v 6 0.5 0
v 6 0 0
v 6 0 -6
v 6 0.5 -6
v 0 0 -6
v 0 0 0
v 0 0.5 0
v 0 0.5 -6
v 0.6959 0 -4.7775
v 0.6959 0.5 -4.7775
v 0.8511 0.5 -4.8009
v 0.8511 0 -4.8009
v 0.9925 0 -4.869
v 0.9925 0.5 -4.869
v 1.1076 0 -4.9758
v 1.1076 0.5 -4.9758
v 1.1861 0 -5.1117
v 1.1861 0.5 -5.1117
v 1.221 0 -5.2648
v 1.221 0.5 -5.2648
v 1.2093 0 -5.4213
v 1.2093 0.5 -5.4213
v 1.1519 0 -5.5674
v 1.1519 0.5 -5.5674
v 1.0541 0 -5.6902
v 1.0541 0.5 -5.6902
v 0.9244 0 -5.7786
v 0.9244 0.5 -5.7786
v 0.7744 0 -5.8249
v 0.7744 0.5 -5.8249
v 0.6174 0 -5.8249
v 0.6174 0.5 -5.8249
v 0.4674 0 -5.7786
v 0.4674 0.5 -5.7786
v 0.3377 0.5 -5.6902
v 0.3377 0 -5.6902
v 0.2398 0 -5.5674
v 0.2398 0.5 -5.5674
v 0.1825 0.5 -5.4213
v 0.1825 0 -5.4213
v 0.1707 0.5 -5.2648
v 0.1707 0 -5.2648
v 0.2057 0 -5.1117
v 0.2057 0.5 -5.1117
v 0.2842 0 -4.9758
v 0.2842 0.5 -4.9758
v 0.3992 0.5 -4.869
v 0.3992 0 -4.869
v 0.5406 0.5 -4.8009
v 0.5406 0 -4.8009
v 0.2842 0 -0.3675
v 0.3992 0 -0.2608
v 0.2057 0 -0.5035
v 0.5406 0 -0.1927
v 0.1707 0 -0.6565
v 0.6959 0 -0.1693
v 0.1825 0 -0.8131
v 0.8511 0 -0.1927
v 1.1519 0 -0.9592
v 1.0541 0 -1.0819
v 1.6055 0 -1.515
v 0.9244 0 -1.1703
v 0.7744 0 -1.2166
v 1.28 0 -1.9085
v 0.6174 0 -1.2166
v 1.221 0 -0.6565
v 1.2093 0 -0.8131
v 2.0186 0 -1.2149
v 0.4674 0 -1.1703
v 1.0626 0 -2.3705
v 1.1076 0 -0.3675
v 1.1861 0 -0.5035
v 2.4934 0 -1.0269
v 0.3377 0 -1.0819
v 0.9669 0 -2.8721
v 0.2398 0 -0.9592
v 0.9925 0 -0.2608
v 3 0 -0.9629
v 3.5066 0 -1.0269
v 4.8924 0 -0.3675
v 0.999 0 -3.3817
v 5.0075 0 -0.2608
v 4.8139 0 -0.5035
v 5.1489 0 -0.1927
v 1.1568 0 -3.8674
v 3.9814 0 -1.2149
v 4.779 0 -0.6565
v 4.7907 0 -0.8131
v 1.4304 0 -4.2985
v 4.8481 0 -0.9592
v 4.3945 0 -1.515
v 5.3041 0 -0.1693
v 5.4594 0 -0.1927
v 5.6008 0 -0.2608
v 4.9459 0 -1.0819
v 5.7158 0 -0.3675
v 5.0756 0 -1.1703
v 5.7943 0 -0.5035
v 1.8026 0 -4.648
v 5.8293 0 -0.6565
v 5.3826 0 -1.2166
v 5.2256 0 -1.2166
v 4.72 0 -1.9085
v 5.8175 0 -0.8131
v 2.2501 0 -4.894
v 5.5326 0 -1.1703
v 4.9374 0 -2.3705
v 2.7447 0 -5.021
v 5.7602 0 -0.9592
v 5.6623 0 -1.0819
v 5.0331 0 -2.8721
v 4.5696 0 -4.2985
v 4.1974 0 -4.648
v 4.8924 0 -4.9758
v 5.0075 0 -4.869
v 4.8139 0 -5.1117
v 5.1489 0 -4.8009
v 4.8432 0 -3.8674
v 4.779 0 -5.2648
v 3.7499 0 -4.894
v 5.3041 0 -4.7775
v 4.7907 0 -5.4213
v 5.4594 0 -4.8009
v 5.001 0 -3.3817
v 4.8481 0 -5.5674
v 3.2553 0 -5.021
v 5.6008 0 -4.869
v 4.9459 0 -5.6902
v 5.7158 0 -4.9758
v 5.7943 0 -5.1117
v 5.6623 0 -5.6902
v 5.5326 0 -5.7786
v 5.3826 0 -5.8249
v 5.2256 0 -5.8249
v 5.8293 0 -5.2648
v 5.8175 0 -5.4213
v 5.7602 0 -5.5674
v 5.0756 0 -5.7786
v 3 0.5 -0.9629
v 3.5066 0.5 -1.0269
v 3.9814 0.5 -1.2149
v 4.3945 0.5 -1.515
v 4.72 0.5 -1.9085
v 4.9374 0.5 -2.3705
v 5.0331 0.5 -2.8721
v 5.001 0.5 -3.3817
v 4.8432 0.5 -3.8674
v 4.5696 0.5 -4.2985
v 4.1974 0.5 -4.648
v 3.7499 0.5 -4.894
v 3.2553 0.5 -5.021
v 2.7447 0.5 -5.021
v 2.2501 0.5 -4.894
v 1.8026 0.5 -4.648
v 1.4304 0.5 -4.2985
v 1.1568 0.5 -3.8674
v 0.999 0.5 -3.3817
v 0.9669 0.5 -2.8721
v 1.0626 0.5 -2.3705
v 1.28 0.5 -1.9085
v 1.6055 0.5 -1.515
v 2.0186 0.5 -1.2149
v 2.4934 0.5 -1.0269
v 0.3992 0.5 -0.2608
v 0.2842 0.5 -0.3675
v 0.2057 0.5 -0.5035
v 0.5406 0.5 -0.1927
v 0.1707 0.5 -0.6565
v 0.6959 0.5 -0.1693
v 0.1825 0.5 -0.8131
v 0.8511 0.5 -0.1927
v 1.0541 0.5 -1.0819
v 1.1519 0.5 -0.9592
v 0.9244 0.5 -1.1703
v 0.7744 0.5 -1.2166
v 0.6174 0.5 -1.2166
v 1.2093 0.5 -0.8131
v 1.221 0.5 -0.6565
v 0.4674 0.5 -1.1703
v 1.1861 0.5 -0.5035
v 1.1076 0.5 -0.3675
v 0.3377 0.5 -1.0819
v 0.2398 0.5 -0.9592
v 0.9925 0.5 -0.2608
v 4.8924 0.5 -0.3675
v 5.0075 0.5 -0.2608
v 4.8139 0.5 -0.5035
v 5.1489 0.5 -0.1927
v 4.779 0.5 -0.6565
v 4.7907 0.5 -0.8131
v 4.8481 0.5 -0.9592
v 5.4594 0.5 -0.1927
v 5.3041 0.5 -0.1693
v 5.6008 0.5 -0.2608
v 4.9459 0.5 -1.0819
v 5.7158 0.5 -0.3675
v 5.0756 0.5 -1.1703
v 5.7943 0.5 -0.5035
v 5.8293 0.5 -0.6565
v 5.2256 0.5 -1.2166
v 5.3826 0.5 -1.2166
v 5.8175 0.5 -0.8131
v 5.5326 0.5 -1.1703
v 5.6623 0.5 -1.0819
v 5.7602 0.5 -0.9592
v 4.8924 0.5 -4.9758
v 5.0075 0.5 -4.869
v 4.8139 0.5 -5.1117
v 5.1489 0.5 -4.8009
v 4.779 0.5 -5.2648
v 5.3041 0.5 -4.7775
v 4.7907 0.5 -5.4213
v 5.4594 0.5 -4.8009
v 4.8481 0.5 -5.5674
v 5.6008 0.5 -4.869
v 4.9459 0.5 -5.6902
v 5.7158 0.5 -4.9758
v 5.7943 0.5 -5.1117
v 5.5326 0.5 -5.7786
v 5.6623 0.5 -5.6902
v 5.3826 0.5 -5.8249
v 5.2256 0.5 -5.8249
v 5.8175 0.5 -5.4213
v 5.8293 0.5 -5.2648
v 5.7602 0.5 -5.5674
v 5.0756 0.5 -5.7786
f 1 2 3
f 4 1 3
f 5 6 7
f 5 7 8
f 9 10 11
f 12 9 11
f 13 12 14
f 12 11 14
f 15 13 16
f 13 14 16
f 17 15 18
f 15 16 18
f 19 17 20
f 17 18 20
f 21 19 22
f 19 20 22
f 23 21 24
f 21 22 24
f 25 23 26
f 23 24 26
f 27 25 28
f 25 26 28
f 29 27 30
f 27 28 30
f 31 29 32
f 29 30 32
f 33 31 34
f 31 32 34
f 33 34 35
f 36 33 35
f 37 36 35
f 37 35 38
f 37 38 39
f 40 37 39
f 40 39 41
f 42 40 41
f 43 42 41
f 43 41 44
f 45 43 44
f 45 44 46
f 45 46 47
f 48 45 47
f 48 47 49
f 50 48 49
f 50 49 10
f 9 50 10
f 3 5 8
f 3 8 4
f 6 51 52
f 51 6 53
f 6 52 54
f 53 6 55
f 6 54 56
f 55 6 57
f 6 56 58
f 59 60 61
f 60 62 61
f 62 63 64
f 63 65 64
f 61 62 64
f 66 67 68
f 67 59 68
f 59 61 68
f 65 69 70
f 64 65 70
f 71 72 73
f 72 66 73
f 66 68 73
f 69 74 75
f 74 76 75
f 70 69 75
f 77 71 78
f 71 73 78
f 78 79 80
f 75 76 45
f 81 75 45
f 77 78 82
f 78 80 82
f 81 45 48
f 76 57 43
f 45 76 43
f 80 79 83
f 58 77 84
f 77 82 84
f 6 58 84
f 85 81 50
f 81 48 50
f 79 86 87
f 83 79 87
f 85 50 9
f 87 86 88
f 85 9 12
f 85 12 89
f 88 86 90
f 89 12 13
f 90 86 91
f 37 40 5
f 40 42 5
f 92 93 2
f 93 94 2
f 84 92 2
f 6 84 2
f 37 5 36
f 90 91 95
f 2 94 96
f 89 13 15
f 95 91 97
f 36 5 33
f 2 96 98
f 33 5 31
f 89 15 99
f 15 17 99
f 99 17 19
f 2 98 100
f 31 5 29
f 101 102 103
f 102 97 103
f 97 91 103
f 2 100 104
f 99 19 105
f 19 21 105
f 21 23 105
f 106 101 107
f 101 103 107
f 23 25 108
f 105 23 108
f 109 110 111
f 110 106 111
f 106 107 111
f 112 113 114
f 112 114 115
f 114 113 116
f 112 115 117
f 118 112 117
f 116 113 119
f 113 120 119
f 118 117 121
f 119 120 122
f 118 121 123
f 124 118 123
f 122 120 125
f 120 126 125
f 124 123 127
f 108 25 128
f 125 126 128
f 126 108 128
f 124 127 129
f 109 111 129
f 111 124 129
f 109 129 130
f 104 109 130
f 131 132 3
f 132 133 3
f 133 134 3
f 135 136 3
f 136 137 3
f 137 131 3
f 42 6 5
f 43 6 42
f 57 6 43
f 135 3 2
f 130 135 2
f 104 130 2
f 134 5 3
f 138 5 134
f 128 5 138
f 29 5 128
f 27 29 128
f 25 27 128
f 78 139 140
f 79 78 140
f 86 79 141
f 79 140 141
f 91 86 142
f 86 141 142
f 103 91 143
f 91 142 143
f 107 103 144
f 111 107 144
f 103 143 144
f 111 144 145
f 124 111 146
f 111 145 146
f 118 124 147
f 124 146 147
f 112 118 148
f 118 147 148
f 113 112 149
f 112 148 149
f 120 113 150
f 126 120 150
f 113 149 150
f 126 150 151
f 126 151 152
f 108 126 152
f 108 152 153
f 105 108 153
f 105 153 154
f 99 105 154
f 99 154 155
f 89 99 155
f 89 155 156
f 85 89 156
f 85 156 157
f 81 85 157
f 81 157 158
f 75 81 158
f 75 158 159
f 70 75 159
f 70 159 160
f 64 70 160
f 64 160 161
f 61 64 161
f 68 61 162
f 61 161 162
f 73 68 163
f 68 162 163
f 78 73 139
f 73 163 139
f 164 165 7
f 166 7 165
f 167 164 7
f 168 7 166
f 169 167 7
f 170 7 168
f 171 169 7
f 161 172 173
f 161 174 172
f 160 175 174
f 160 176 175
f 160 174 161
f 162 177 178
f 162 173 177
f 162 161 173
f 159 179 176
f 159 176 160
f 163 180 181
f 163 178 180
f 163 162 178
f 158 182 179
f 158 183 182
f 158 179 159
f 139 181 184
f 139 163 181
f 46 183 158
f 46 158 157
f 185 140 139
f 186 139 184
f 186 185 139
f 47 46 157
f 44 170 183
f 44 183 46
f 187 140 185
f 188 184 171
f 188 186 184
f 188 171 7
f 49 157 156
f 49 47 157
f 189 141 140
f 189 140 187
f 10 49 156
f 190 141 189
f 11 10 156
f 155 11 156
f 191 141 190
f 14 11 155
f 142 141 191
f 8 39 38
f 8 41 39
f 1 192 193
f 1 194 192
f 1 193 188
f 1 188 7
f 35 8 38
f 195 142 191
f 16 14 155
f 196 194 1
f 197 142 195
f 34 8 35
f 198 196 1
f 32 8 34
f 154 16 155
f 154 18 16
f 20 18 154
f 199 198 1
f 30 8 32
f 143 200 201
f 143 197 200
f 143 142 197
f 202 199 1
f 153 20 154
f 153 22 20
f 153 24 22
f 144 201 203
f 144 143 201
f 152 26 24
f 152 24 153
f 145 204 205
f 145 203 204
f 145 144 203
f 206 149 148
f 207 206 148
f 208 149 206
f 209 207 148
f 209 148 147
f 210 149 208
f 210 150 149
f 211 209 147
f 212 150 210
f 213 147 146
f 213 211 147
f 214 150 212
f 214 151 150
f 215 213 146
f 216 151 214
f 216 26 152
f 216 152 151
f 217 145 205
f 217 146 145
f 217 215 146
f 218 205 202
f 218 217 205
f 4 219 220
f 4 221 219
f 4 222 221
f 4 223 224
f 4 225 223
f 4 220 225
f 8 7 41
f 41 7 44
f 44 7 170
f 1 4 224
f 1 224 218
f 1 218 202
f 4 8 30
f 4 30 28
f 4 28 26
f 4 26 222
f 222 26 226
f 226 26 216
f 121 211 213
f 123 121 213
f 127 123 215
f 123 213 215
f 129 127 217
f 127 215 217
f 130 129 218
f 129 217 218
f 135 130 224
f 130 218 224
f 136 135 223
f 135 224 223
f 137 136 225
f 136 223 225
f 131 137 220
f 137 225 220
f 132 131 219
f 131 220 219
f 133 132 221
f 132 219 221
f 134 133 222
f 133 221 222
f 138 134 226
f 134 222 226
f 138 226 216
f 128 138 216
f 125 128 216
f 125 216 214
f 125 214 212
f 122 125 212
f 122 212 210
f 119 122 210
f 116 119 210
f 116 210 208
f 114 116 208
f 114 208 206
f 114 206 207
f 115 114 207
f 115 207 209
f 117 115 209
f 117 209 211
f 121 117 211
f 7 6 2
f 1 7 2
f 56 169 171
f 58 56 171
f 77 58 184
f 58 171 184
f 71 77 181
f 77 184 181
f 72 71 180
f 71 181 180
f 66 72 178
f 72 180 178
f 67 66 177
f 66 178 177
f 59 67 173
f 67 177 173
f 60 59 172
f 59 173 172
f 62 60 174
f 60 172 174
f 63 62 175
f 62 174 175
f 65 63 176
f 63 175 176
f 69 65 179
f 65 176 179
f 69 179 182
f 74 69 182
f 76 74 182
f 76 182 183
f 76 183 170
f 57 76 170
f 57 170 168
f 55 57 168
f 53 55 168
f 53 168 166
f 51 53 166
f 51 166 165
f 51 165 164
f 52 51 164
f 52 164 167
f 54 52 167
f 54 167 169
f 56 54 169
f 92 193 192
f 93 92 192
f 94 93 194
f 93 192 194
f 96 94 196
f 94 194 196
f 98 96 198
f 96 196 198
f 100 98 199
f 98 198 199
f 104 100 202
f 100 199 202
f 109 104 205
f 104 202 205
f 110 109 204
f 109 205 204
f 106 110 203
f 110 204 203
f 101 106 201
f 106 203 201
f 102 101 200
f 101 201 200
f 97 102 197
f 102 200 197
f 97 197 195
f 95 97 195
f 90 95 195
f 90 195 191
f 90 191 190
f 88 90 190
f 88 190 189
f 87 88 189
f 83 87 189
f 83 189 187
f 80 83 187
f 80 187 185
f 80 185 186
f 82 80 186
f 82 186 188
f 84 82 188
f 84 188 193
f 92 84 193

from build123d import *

# Parameters (mm, degrees)
ESQUISSE1_W             = 6
ESQUISSE1_H             = 6
EXTRUSION1_DEPTH        = 0.5
ESQUISSE2_R             = 2.037099296
ENL_V_MAT_EXTRU_1_DEPTH = 1.5
ESQUISSE3_R             = 0.526608141
ENL_V_MAT_EXTRU_3_DEPTH = 1.5


with BuildPart() as part:
    # Esquisse1 → Extrusion1 (new body)
    with BuildSketch(Plane(origin=(0, 0, 0), x_dir=(1, 0, 0), z_dir=(0, 1, 0))):
        with Locations((3, 3)):
            Rectangle(ESQUISSE1_W, ESQUISSE1_H)
    extrude(amount=EXTRUSION1_DEPTH)

    # Esquisse2 → Enlèv. mat.-Extru.1 (cut, through all)
    with BuildSketch(Plane(origin=(0, 0.5, 0), x_dir=(-1, 0, 0), z_dir=(0, 1, 0))):
        with Locations(Location((-3, -3, 0), (0, 0, 90))):  # turned: the seam where the file's is
            Circle(ESQUISSE2_R)
    extrude(amount=-ENL_V_MAT_EXTRU_1_DEPTH, mode=Mode.SUBTRACT)

    # Esquisse3 → Enlèv. mat.-Extru.3 (cut, through all)
    with BuildSketch(Plane(origin=(0, 0.5, 0), x_dir=(-1, 0, 0), z_dir=(0, 1, 0))):
        with Locations(Location((-0.695868946, -5.304131054, 0), (0, 0, 90))):  # turned: the seam where the file's is
            Circle(ESQUISSE3_R)
        with Locations(Location((-5.304131054, -5.304131054, 0), (0, 0, 90))):  # turned: the seam where the file's is
            Circle(ESQUISSE3_R)
        with Locations(Location((-5.304131054, -0.695868946, 0), (0, 0, 90))):  # turned: the seam where the file's is
            Circle(ESQUISSE3_R)
        with Locations(Location((-0.695868946, -0.695868946, 0), (0, 0, 90))):  # turned: the seam where the file's is
            Circle(ESQUISSE3_R)
    extrude(amount=-ENL_V_MAT_EXTRU_3_DEPTH, mode=Mode.SUBTRACT)


solid = part.part
